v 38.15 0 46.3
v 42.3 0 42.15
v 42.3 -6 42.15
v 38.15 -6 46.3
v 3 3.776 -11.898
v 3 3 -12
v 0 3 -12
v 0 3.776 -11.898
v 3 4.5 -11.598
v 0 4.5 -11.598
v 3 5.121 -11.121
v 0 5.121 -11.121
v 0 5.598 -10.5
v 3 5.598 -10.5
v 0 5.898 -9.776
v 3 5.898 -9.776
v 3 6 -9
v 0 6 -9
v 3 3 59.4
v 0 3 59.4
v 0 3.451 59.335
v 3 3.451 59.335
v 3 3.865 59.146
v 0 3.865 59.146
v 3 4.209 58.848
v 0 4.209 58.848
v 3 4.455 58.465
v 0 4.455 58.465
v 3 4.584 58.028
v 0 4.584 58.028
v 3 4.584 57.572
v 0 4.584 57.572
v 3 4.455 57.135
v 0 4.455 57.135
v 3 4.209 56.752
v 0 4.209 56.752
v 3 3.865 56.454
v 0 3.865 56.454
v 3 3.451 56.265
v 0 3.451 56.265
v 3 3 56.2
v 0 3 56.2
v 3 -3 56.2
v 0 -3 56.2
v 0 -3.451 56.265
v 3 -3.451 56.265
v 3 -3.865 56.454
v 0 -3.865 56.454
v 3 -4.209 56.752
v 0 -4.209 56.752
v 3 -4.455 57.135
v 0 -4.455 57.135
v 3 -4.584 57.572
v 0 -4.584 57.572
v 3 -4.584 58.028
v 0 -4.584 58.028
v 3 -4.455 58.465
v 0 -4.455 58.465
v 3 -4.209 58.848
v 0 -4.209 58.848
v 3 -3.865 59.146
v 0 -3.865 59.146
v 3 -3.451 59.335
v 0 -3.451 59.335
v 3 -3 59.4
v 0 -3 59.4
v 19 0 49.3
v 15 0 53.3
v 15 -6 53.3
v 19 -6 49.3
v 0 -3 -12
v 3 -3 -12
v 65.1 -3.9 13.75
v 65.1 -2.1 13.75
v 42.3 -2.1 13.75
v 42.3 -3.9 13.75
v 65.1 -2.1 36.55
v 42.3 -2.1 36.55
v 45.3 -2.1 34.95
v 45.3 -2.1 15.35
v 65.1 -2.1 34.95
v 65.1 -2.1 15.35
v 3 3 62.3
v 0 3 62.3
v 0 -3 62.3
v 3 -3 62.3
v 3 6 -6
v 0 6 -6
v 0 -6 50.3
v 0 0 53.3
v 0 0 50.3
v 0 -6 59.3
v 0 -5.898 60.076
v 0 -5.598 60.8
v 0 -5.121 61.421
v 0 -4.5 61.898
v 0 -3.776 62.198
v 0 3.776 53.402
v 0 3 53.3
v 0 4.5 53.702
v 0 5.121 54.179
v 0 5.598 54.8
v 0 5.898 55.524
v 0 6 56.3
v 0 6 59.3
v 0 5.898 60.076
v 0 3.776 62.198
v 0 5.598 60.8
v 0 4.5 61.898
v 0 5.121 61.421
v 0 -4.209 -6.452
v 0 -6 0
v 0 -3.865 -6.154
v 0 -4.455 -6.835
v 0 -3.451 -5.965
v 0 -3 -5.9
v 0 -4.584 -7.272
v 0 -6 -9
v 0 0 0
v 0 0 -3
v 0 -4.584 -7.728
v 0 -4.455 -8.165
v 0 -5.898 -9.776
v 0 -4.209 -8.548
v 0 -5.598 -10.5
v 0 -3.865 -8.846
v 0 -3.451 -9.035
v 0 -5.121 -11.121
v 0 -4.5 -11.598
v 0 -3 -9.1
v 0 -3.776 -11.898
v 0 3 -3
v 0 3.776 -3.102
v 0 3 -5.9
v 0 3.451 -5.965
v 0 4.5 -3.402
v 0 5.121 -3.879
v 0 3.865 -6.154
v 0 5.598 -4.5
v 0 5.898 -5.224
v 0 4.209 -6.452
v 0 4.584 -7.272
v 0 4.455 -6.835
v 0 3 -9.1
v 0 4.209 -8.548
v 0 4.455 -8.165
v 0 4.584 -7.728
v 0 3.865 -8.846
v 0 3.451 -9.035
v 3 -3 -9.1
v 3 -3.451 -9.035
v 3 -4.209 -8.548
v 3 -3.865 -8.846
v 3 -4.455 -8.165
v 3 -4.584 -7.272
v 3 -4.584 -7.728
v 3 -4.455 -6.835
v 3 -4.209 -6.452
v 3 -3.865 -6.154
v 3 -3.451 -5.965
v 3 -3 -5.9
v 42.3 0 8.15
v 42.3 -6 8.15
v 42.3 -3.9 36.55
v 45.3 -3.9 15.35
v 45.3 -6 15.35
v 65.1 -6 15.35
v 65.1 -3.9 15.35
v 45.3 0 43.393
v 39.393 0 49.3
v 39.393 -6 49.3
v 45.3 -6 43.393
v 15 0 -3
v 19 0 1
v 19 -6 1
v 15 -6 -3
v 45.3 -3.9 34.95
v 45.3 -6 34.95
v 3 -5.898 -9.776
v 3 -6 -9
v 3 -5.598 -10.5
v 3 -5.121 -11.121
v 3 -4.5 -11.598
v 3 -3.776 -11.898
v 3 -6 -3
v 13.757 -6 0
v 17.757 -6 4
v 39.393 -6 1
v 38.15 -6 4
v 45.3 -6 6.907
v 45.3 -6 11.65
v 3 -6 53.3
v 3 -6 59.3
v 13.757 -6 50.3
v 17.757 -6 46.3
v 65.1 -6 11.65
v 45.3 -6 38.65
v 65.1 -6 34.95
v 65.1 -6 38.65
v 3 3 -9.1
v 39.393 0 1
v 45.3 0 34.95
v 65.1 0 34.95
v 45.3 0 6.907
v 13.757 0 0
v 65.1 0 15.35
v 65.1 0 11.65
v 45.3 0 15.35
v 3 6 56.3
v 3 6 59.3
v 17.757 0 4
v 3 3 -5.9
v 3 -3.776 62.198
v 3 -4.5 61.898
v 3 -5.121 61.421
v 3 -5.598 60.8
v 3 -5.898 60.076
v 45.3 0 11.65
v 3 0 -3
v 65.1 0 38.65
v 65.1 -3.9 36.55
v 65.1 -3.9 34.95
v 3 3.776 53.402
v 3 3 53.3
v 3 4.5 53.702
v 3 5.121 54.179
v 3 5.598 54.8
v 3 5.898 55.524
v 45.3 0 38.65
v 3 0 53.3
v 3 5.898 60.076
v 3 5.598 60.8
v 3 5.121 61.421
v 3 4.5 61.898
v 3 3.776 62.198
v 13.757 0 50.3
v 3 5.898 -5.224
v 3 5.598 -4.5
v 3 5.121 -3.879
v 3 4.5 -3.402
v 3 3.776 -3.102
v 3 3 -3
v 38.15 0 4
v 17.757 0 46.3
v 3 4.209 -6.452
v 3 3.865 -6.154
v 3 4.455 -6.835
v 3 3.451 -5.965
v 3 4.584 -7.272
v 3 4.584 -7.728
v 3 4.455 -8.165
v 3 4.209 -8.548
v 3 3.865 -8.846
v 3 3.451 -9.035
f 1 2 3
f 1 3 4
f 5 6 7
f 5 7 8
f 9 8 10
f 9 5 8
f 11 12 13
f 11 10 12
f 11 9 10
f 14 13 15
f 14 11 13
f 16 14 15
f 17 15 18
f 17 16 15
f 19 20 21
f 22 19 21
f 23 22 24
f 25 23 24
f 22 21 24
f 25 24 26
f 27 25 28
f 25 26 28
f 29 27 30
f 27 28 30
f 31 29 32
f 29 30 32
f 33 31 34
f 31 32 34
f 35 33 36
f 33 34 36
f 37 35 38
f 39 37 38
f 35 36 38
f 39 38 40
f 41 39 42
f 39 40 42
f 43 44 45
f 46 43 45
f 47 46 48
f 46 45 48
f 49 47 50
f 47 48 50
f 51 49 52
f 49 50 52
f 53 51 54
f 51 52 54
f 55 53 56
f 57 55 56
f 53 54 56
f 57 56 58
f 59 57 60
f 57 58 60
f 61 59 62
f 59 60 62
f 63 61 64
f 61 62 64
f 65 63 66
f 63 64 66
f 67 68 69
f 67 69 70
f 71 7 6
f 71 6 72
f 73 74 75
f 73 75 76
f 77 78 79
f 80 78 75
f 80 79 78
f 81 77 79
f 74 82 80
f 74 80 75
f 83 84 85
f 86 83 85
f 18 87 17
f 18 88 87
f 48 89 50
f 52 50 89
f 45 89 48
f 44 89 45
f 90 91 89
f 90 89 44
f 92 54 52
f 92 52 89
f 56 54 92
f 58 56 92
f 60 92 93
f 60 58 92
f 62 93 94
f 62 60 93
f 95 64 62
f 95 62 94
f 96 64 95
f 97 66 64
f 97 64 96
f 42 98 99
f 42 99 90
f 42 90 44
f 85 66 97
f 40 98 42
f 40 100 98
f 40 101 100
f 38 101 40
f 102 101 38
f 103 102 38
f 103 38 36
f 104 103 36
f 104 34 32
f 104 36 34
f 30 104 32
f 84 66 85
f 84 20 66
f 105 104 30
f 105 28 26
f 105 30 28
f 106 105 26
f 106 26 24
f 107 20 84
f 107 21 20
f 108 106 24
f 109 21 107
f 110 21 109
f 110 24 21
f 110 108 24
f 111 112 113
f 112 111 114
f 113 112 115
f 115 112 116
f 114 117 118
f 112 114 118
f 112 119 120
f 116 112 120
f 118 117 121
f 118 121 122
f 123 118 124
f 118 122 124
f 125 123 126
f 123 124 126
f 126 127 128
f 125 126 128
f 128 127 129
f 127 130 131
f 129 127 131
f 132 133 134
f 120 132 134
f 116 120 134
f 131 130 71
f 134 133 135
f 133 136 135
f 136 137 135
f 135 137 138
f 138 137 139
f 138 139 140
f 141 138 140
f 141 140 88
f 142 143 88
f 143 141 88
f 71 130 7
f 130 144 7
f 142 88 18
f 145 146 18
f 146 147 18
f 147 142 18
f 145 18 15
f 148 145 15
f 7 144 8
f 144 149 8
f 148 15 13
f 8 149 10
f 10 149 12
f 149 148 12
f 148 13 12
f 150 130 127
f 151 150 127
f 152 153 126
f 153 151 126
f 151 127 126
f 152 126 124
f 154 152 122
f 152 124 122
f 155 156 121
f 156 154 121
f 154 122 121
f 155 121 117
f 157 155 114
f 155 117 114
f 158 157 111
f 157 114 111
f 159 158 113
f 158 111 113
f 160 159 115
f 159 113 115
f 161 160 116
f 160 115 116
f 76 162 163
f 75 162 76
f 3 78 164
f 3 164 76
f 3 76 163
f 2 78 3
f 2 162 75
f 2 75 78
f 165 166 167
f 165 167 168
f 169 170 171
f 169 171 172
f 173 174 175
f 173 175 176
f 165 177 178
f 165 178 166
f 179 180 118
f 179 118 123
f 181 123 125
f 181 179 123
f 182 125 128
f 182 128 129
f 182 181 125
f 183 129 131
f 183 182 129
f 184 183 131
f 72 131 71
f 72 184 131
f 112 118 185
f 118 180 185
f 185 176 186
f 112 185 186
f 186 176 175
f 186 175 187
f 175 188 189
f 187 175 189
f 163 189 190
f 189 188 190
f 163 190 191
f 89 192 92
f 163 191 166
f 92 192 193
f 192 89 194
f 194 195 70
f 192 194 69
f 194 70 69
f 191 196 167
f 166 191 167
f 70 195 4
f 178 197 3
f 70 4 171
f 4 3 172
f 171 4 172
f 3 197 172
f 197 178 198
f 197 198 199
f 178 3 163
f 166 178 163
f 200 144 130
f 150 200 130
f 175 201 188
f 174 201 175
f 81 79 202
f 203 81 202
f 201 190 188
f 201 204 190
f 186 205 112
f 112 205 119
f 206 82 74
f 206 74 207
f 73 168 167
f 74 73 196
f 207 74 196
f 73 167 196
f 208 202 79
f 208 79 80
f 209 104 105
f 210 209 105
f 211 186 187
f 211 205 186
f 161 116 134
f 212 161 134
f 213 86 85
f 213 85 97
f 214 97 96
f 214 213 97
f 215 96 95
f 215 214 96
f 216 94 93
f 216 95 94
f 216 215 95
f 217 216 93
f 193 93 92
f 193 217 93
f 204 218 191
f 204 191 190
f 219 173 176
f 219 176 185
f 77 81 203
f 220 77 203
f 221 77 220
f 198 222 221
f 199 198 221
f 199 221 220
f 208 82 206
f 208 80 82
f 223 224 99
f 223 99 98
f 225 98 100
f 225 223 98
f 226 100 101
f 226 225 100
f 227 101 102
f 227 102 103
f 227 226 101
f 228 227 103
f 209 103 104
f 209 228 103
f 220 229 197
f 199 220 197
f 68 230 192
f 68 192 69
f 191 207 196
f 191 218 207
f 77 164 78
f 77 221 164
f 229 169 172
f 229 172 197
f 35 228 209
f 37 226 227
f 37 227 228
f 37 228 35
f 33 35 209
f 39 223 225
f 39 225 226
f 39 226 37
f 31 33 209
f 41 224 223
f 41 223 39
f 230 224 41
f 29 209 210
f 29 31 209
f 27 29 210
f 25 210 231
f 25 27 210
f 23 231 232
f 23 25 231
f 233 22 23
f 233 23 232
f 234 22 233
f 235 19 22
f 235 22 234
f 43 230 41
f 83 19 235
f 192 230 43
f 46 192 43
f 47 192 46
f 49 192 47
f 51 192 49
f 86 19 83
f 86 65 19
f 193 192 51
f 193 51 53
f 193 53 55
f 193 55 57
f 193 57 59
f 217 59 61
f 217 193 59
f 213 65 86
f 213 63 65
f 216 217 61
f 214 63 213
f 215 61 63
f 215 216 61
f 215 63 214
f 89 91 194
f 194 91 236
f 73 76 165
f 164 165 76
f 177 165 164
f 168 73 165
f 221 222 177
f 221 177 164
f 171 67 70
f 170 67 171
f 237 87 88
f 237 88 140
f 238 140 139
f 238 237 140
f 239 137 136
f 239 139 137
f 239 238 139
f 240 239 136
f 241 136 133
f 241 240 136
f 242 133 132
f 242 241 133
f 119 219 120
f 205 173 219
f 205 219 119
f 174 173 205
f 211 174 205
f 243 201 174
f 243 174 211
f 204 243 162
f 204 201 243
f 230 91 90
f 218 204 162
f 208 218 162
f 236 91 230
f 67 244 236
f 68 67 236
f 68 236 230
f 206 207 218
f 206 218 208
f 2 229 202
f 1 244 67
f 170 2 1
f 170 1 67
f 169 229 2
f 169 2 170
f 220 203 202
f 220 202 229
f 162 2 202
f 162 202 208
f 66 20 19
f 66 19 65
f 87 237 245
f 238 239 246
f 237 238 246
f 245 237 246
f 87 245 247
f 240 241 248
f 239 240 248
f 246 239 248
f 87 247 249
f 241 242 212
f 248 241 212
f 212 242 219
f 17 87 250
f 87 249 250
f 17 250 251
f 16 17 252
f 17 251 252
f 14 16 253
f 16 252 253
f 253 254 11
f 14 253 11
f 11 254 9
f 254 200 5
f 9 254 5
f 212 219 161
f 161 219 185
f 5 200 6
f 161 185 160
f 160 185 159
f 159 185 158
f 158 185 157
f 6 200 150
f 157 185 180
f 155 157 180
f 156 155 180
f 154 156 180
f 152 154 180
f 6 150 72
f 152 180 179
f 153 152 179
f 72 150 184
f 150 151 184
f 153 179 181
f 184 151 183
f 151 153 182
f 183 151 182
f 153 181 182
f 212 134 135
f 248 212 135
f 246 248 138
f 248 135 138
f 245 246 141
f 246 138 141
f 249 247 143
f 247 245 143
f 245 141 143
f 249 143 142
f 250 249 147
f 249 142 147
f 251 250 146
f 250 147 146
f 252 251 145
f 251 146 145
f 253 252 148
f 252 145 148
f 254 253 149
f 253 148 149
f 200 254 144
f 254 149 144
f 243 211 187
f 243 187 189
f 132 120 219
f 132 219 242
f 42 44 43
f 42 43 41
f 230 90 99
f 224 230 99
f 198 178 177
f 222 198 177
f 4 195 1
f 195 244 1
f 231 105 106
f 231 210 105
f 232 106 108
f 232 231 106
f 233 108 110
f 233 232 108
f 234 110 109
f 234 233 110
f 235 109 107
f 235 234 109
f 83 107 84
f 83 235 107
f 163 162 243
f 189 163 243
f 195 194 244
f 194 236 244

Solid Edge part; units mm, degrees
sketch "Sketch1" plane through (0, 0, 0) normal (0, -1, 0) x (1, 0, 0)
  line L0 (45.3, 43.3926) -> (45.3, 6.9074)
  line L1 (45.3, 6.9074) -> (39.3926, 1)
  line L2 (39.3926, 1) -> (19, 1)
  line L3 (19, 1) -> (15, -3)
  line L4 (15, -3) -> (0, -3)
  line L5 (0, 0) -> (0, -3)
  line L6 (13.7574, 0) -> (0, 0)
  line L7 (13.7574, 0) -> (17.7574, 4)
  line L8 (17.7574, 4) -> (38.15, 4)
  line L9 (42.3, 8.15) -> (38.15, 4)
  line L10 (42.3, 8.15) -> (42.3, 42.15)
  line L11 (42.3, 42.15) -> (38.15, 46.3)
  line L12 (17.7574, 46.3) -> (38.15, 46.3)
  line L13 (13.7574, 50.3) -> (17.7574, 46.3)
  line L14 (0, 50.3) -> (13.7574, 50.3)
  line L15 (0, 50.3) -> (0, 53.3)
  line L16 (0, 53.3) -> (15, 53.3)
  line L17 (15, 53.3) -> (19, 49.3)
  line L18 (19, 49.3) -> (39.3926, 49.3)
  line L19 (39.3926, 49.3) -> (45.3, 43.3926)
extrude "Protrusion1" add sketch "Sketch1" along normal blind 6
sketch "Sketch2" plane through (45.3, -3, 24.9165) normal (1, 0, 0) x (0, 0, -1)
  line L0 (-11.6335, 0.9) -> (11.1665, 0.9)
  line L1 (11.1665, 0.9) -> (11.1665, -0.9)
  line L2 (11.1665, -0.9) -> (-11.6335, -0.9)
  line L3 (-11.6335, -0.9) -> (-11.6335, 0.9)
extrude "VaciadoExtruido_1" cut sketch "Sketch2" against normal blind 3
sketch "Sketch3" plane through (45.3, -3, 24.9165) normal (1, 0, 0) x (0, 0, -1)
  line L0 (-13.7335, 3) -> (-13.7335, -3)
  line L1 (-13.7335, -3) -> (-10.0335, -3)
  line L2 (-10.0335, -3) -> (-10.0335, -0.9)
  line L3 (-10.0335, -0.9) -> (-11.6335, -0.9)
  line L4 (-11.6335, -0.9) -> (-11.6335, 0.9)
  line L5 (-11.6335, 0.9) -> (-10.0335, 0.9)
  line L6 (-10.0335, 0.9) -> (-10.0335, 3)
  line L7 (-10.0335, 3) -> (-13.7335, 3)
  line L8 (9.5665, -3) -> (9.5665, -0.9)
  line L9 (9.5665, -0.9) -> (11.1665, -0.9)
  line L10 (11.1665, -0.9) -> (11.1665, 0.9)
  line L11 (11.1665, 0.9) -> (9.5665, 0.9)
  line L12 (9.5665, 0.9) -> (9.5665, 3)
  line L13 (9.5665, 3) -> (13.2665, 3)
  line L14 (13.2665, 3) -> (13.2665, -3)
  line L15 (13.2665, -3) -> (9.5665, -3)
  dimension "D1" = 2.1
  dimension "D2" = 1.6
extrude "ProtrusiónExtruida_2" add sketch "Sketch3" along normal blind 19.8
sketch "Sketch4" plane through (0, -3, -1.5) normal (-1, 0, 0) x (0, 0, 1)
  line L0 (-7.6, 6) -> (-7.6, 0)
  line L1 (-4.4, 0) -> (-4.4, 6)
  arc A0 (-4.4, 0) -> (-7.6, 0) centre (-6, 0) cw
  arc A1 (-7.6, 6) -> (-4.4, 6) centre (-6, 6) cw
  line L2 (-1.5, -3) -> (-1.5, 9)
  line L3 (-1.5, 9) -> (-10.5, 9)
  line L4 (-10.5, 9) -> (-10.5, -3)
  line L5 (-10.5, -3) -> (-1.5, -3)
  line L6 (54.8, -3) -> (54.8, 9)
  line L7 (54.8, 9) -> (63.8, 9)
  line L8 (63.8, 9) -> (63.8, -3)
  line L9 (63.8, -3) -> (54.8, -3)
  arc A2 (60.9, 6) -> (57.7, 6) centre (59.3, 6) ccw
  line L10 (57.7, 0) -> (57.7, 6)
  arc A3 (57.7, 0) -> (60.9, 0) centre (59.3, 0) ccw
  line L11 (60.9, 6) -> (60.9, 0)
extrude "ProtrusiónExtruida_3" add sketch "Sketch4" against normal blind 3
fillet "Redondeo_1" radius 3 6 edges at (1.5, -6, 62.3) (1.5, 6, 62.3) (1.5, 6, 53.3) (1.5, 6, -12) (1.5, 6, -3) (1.5, -6, -12)
